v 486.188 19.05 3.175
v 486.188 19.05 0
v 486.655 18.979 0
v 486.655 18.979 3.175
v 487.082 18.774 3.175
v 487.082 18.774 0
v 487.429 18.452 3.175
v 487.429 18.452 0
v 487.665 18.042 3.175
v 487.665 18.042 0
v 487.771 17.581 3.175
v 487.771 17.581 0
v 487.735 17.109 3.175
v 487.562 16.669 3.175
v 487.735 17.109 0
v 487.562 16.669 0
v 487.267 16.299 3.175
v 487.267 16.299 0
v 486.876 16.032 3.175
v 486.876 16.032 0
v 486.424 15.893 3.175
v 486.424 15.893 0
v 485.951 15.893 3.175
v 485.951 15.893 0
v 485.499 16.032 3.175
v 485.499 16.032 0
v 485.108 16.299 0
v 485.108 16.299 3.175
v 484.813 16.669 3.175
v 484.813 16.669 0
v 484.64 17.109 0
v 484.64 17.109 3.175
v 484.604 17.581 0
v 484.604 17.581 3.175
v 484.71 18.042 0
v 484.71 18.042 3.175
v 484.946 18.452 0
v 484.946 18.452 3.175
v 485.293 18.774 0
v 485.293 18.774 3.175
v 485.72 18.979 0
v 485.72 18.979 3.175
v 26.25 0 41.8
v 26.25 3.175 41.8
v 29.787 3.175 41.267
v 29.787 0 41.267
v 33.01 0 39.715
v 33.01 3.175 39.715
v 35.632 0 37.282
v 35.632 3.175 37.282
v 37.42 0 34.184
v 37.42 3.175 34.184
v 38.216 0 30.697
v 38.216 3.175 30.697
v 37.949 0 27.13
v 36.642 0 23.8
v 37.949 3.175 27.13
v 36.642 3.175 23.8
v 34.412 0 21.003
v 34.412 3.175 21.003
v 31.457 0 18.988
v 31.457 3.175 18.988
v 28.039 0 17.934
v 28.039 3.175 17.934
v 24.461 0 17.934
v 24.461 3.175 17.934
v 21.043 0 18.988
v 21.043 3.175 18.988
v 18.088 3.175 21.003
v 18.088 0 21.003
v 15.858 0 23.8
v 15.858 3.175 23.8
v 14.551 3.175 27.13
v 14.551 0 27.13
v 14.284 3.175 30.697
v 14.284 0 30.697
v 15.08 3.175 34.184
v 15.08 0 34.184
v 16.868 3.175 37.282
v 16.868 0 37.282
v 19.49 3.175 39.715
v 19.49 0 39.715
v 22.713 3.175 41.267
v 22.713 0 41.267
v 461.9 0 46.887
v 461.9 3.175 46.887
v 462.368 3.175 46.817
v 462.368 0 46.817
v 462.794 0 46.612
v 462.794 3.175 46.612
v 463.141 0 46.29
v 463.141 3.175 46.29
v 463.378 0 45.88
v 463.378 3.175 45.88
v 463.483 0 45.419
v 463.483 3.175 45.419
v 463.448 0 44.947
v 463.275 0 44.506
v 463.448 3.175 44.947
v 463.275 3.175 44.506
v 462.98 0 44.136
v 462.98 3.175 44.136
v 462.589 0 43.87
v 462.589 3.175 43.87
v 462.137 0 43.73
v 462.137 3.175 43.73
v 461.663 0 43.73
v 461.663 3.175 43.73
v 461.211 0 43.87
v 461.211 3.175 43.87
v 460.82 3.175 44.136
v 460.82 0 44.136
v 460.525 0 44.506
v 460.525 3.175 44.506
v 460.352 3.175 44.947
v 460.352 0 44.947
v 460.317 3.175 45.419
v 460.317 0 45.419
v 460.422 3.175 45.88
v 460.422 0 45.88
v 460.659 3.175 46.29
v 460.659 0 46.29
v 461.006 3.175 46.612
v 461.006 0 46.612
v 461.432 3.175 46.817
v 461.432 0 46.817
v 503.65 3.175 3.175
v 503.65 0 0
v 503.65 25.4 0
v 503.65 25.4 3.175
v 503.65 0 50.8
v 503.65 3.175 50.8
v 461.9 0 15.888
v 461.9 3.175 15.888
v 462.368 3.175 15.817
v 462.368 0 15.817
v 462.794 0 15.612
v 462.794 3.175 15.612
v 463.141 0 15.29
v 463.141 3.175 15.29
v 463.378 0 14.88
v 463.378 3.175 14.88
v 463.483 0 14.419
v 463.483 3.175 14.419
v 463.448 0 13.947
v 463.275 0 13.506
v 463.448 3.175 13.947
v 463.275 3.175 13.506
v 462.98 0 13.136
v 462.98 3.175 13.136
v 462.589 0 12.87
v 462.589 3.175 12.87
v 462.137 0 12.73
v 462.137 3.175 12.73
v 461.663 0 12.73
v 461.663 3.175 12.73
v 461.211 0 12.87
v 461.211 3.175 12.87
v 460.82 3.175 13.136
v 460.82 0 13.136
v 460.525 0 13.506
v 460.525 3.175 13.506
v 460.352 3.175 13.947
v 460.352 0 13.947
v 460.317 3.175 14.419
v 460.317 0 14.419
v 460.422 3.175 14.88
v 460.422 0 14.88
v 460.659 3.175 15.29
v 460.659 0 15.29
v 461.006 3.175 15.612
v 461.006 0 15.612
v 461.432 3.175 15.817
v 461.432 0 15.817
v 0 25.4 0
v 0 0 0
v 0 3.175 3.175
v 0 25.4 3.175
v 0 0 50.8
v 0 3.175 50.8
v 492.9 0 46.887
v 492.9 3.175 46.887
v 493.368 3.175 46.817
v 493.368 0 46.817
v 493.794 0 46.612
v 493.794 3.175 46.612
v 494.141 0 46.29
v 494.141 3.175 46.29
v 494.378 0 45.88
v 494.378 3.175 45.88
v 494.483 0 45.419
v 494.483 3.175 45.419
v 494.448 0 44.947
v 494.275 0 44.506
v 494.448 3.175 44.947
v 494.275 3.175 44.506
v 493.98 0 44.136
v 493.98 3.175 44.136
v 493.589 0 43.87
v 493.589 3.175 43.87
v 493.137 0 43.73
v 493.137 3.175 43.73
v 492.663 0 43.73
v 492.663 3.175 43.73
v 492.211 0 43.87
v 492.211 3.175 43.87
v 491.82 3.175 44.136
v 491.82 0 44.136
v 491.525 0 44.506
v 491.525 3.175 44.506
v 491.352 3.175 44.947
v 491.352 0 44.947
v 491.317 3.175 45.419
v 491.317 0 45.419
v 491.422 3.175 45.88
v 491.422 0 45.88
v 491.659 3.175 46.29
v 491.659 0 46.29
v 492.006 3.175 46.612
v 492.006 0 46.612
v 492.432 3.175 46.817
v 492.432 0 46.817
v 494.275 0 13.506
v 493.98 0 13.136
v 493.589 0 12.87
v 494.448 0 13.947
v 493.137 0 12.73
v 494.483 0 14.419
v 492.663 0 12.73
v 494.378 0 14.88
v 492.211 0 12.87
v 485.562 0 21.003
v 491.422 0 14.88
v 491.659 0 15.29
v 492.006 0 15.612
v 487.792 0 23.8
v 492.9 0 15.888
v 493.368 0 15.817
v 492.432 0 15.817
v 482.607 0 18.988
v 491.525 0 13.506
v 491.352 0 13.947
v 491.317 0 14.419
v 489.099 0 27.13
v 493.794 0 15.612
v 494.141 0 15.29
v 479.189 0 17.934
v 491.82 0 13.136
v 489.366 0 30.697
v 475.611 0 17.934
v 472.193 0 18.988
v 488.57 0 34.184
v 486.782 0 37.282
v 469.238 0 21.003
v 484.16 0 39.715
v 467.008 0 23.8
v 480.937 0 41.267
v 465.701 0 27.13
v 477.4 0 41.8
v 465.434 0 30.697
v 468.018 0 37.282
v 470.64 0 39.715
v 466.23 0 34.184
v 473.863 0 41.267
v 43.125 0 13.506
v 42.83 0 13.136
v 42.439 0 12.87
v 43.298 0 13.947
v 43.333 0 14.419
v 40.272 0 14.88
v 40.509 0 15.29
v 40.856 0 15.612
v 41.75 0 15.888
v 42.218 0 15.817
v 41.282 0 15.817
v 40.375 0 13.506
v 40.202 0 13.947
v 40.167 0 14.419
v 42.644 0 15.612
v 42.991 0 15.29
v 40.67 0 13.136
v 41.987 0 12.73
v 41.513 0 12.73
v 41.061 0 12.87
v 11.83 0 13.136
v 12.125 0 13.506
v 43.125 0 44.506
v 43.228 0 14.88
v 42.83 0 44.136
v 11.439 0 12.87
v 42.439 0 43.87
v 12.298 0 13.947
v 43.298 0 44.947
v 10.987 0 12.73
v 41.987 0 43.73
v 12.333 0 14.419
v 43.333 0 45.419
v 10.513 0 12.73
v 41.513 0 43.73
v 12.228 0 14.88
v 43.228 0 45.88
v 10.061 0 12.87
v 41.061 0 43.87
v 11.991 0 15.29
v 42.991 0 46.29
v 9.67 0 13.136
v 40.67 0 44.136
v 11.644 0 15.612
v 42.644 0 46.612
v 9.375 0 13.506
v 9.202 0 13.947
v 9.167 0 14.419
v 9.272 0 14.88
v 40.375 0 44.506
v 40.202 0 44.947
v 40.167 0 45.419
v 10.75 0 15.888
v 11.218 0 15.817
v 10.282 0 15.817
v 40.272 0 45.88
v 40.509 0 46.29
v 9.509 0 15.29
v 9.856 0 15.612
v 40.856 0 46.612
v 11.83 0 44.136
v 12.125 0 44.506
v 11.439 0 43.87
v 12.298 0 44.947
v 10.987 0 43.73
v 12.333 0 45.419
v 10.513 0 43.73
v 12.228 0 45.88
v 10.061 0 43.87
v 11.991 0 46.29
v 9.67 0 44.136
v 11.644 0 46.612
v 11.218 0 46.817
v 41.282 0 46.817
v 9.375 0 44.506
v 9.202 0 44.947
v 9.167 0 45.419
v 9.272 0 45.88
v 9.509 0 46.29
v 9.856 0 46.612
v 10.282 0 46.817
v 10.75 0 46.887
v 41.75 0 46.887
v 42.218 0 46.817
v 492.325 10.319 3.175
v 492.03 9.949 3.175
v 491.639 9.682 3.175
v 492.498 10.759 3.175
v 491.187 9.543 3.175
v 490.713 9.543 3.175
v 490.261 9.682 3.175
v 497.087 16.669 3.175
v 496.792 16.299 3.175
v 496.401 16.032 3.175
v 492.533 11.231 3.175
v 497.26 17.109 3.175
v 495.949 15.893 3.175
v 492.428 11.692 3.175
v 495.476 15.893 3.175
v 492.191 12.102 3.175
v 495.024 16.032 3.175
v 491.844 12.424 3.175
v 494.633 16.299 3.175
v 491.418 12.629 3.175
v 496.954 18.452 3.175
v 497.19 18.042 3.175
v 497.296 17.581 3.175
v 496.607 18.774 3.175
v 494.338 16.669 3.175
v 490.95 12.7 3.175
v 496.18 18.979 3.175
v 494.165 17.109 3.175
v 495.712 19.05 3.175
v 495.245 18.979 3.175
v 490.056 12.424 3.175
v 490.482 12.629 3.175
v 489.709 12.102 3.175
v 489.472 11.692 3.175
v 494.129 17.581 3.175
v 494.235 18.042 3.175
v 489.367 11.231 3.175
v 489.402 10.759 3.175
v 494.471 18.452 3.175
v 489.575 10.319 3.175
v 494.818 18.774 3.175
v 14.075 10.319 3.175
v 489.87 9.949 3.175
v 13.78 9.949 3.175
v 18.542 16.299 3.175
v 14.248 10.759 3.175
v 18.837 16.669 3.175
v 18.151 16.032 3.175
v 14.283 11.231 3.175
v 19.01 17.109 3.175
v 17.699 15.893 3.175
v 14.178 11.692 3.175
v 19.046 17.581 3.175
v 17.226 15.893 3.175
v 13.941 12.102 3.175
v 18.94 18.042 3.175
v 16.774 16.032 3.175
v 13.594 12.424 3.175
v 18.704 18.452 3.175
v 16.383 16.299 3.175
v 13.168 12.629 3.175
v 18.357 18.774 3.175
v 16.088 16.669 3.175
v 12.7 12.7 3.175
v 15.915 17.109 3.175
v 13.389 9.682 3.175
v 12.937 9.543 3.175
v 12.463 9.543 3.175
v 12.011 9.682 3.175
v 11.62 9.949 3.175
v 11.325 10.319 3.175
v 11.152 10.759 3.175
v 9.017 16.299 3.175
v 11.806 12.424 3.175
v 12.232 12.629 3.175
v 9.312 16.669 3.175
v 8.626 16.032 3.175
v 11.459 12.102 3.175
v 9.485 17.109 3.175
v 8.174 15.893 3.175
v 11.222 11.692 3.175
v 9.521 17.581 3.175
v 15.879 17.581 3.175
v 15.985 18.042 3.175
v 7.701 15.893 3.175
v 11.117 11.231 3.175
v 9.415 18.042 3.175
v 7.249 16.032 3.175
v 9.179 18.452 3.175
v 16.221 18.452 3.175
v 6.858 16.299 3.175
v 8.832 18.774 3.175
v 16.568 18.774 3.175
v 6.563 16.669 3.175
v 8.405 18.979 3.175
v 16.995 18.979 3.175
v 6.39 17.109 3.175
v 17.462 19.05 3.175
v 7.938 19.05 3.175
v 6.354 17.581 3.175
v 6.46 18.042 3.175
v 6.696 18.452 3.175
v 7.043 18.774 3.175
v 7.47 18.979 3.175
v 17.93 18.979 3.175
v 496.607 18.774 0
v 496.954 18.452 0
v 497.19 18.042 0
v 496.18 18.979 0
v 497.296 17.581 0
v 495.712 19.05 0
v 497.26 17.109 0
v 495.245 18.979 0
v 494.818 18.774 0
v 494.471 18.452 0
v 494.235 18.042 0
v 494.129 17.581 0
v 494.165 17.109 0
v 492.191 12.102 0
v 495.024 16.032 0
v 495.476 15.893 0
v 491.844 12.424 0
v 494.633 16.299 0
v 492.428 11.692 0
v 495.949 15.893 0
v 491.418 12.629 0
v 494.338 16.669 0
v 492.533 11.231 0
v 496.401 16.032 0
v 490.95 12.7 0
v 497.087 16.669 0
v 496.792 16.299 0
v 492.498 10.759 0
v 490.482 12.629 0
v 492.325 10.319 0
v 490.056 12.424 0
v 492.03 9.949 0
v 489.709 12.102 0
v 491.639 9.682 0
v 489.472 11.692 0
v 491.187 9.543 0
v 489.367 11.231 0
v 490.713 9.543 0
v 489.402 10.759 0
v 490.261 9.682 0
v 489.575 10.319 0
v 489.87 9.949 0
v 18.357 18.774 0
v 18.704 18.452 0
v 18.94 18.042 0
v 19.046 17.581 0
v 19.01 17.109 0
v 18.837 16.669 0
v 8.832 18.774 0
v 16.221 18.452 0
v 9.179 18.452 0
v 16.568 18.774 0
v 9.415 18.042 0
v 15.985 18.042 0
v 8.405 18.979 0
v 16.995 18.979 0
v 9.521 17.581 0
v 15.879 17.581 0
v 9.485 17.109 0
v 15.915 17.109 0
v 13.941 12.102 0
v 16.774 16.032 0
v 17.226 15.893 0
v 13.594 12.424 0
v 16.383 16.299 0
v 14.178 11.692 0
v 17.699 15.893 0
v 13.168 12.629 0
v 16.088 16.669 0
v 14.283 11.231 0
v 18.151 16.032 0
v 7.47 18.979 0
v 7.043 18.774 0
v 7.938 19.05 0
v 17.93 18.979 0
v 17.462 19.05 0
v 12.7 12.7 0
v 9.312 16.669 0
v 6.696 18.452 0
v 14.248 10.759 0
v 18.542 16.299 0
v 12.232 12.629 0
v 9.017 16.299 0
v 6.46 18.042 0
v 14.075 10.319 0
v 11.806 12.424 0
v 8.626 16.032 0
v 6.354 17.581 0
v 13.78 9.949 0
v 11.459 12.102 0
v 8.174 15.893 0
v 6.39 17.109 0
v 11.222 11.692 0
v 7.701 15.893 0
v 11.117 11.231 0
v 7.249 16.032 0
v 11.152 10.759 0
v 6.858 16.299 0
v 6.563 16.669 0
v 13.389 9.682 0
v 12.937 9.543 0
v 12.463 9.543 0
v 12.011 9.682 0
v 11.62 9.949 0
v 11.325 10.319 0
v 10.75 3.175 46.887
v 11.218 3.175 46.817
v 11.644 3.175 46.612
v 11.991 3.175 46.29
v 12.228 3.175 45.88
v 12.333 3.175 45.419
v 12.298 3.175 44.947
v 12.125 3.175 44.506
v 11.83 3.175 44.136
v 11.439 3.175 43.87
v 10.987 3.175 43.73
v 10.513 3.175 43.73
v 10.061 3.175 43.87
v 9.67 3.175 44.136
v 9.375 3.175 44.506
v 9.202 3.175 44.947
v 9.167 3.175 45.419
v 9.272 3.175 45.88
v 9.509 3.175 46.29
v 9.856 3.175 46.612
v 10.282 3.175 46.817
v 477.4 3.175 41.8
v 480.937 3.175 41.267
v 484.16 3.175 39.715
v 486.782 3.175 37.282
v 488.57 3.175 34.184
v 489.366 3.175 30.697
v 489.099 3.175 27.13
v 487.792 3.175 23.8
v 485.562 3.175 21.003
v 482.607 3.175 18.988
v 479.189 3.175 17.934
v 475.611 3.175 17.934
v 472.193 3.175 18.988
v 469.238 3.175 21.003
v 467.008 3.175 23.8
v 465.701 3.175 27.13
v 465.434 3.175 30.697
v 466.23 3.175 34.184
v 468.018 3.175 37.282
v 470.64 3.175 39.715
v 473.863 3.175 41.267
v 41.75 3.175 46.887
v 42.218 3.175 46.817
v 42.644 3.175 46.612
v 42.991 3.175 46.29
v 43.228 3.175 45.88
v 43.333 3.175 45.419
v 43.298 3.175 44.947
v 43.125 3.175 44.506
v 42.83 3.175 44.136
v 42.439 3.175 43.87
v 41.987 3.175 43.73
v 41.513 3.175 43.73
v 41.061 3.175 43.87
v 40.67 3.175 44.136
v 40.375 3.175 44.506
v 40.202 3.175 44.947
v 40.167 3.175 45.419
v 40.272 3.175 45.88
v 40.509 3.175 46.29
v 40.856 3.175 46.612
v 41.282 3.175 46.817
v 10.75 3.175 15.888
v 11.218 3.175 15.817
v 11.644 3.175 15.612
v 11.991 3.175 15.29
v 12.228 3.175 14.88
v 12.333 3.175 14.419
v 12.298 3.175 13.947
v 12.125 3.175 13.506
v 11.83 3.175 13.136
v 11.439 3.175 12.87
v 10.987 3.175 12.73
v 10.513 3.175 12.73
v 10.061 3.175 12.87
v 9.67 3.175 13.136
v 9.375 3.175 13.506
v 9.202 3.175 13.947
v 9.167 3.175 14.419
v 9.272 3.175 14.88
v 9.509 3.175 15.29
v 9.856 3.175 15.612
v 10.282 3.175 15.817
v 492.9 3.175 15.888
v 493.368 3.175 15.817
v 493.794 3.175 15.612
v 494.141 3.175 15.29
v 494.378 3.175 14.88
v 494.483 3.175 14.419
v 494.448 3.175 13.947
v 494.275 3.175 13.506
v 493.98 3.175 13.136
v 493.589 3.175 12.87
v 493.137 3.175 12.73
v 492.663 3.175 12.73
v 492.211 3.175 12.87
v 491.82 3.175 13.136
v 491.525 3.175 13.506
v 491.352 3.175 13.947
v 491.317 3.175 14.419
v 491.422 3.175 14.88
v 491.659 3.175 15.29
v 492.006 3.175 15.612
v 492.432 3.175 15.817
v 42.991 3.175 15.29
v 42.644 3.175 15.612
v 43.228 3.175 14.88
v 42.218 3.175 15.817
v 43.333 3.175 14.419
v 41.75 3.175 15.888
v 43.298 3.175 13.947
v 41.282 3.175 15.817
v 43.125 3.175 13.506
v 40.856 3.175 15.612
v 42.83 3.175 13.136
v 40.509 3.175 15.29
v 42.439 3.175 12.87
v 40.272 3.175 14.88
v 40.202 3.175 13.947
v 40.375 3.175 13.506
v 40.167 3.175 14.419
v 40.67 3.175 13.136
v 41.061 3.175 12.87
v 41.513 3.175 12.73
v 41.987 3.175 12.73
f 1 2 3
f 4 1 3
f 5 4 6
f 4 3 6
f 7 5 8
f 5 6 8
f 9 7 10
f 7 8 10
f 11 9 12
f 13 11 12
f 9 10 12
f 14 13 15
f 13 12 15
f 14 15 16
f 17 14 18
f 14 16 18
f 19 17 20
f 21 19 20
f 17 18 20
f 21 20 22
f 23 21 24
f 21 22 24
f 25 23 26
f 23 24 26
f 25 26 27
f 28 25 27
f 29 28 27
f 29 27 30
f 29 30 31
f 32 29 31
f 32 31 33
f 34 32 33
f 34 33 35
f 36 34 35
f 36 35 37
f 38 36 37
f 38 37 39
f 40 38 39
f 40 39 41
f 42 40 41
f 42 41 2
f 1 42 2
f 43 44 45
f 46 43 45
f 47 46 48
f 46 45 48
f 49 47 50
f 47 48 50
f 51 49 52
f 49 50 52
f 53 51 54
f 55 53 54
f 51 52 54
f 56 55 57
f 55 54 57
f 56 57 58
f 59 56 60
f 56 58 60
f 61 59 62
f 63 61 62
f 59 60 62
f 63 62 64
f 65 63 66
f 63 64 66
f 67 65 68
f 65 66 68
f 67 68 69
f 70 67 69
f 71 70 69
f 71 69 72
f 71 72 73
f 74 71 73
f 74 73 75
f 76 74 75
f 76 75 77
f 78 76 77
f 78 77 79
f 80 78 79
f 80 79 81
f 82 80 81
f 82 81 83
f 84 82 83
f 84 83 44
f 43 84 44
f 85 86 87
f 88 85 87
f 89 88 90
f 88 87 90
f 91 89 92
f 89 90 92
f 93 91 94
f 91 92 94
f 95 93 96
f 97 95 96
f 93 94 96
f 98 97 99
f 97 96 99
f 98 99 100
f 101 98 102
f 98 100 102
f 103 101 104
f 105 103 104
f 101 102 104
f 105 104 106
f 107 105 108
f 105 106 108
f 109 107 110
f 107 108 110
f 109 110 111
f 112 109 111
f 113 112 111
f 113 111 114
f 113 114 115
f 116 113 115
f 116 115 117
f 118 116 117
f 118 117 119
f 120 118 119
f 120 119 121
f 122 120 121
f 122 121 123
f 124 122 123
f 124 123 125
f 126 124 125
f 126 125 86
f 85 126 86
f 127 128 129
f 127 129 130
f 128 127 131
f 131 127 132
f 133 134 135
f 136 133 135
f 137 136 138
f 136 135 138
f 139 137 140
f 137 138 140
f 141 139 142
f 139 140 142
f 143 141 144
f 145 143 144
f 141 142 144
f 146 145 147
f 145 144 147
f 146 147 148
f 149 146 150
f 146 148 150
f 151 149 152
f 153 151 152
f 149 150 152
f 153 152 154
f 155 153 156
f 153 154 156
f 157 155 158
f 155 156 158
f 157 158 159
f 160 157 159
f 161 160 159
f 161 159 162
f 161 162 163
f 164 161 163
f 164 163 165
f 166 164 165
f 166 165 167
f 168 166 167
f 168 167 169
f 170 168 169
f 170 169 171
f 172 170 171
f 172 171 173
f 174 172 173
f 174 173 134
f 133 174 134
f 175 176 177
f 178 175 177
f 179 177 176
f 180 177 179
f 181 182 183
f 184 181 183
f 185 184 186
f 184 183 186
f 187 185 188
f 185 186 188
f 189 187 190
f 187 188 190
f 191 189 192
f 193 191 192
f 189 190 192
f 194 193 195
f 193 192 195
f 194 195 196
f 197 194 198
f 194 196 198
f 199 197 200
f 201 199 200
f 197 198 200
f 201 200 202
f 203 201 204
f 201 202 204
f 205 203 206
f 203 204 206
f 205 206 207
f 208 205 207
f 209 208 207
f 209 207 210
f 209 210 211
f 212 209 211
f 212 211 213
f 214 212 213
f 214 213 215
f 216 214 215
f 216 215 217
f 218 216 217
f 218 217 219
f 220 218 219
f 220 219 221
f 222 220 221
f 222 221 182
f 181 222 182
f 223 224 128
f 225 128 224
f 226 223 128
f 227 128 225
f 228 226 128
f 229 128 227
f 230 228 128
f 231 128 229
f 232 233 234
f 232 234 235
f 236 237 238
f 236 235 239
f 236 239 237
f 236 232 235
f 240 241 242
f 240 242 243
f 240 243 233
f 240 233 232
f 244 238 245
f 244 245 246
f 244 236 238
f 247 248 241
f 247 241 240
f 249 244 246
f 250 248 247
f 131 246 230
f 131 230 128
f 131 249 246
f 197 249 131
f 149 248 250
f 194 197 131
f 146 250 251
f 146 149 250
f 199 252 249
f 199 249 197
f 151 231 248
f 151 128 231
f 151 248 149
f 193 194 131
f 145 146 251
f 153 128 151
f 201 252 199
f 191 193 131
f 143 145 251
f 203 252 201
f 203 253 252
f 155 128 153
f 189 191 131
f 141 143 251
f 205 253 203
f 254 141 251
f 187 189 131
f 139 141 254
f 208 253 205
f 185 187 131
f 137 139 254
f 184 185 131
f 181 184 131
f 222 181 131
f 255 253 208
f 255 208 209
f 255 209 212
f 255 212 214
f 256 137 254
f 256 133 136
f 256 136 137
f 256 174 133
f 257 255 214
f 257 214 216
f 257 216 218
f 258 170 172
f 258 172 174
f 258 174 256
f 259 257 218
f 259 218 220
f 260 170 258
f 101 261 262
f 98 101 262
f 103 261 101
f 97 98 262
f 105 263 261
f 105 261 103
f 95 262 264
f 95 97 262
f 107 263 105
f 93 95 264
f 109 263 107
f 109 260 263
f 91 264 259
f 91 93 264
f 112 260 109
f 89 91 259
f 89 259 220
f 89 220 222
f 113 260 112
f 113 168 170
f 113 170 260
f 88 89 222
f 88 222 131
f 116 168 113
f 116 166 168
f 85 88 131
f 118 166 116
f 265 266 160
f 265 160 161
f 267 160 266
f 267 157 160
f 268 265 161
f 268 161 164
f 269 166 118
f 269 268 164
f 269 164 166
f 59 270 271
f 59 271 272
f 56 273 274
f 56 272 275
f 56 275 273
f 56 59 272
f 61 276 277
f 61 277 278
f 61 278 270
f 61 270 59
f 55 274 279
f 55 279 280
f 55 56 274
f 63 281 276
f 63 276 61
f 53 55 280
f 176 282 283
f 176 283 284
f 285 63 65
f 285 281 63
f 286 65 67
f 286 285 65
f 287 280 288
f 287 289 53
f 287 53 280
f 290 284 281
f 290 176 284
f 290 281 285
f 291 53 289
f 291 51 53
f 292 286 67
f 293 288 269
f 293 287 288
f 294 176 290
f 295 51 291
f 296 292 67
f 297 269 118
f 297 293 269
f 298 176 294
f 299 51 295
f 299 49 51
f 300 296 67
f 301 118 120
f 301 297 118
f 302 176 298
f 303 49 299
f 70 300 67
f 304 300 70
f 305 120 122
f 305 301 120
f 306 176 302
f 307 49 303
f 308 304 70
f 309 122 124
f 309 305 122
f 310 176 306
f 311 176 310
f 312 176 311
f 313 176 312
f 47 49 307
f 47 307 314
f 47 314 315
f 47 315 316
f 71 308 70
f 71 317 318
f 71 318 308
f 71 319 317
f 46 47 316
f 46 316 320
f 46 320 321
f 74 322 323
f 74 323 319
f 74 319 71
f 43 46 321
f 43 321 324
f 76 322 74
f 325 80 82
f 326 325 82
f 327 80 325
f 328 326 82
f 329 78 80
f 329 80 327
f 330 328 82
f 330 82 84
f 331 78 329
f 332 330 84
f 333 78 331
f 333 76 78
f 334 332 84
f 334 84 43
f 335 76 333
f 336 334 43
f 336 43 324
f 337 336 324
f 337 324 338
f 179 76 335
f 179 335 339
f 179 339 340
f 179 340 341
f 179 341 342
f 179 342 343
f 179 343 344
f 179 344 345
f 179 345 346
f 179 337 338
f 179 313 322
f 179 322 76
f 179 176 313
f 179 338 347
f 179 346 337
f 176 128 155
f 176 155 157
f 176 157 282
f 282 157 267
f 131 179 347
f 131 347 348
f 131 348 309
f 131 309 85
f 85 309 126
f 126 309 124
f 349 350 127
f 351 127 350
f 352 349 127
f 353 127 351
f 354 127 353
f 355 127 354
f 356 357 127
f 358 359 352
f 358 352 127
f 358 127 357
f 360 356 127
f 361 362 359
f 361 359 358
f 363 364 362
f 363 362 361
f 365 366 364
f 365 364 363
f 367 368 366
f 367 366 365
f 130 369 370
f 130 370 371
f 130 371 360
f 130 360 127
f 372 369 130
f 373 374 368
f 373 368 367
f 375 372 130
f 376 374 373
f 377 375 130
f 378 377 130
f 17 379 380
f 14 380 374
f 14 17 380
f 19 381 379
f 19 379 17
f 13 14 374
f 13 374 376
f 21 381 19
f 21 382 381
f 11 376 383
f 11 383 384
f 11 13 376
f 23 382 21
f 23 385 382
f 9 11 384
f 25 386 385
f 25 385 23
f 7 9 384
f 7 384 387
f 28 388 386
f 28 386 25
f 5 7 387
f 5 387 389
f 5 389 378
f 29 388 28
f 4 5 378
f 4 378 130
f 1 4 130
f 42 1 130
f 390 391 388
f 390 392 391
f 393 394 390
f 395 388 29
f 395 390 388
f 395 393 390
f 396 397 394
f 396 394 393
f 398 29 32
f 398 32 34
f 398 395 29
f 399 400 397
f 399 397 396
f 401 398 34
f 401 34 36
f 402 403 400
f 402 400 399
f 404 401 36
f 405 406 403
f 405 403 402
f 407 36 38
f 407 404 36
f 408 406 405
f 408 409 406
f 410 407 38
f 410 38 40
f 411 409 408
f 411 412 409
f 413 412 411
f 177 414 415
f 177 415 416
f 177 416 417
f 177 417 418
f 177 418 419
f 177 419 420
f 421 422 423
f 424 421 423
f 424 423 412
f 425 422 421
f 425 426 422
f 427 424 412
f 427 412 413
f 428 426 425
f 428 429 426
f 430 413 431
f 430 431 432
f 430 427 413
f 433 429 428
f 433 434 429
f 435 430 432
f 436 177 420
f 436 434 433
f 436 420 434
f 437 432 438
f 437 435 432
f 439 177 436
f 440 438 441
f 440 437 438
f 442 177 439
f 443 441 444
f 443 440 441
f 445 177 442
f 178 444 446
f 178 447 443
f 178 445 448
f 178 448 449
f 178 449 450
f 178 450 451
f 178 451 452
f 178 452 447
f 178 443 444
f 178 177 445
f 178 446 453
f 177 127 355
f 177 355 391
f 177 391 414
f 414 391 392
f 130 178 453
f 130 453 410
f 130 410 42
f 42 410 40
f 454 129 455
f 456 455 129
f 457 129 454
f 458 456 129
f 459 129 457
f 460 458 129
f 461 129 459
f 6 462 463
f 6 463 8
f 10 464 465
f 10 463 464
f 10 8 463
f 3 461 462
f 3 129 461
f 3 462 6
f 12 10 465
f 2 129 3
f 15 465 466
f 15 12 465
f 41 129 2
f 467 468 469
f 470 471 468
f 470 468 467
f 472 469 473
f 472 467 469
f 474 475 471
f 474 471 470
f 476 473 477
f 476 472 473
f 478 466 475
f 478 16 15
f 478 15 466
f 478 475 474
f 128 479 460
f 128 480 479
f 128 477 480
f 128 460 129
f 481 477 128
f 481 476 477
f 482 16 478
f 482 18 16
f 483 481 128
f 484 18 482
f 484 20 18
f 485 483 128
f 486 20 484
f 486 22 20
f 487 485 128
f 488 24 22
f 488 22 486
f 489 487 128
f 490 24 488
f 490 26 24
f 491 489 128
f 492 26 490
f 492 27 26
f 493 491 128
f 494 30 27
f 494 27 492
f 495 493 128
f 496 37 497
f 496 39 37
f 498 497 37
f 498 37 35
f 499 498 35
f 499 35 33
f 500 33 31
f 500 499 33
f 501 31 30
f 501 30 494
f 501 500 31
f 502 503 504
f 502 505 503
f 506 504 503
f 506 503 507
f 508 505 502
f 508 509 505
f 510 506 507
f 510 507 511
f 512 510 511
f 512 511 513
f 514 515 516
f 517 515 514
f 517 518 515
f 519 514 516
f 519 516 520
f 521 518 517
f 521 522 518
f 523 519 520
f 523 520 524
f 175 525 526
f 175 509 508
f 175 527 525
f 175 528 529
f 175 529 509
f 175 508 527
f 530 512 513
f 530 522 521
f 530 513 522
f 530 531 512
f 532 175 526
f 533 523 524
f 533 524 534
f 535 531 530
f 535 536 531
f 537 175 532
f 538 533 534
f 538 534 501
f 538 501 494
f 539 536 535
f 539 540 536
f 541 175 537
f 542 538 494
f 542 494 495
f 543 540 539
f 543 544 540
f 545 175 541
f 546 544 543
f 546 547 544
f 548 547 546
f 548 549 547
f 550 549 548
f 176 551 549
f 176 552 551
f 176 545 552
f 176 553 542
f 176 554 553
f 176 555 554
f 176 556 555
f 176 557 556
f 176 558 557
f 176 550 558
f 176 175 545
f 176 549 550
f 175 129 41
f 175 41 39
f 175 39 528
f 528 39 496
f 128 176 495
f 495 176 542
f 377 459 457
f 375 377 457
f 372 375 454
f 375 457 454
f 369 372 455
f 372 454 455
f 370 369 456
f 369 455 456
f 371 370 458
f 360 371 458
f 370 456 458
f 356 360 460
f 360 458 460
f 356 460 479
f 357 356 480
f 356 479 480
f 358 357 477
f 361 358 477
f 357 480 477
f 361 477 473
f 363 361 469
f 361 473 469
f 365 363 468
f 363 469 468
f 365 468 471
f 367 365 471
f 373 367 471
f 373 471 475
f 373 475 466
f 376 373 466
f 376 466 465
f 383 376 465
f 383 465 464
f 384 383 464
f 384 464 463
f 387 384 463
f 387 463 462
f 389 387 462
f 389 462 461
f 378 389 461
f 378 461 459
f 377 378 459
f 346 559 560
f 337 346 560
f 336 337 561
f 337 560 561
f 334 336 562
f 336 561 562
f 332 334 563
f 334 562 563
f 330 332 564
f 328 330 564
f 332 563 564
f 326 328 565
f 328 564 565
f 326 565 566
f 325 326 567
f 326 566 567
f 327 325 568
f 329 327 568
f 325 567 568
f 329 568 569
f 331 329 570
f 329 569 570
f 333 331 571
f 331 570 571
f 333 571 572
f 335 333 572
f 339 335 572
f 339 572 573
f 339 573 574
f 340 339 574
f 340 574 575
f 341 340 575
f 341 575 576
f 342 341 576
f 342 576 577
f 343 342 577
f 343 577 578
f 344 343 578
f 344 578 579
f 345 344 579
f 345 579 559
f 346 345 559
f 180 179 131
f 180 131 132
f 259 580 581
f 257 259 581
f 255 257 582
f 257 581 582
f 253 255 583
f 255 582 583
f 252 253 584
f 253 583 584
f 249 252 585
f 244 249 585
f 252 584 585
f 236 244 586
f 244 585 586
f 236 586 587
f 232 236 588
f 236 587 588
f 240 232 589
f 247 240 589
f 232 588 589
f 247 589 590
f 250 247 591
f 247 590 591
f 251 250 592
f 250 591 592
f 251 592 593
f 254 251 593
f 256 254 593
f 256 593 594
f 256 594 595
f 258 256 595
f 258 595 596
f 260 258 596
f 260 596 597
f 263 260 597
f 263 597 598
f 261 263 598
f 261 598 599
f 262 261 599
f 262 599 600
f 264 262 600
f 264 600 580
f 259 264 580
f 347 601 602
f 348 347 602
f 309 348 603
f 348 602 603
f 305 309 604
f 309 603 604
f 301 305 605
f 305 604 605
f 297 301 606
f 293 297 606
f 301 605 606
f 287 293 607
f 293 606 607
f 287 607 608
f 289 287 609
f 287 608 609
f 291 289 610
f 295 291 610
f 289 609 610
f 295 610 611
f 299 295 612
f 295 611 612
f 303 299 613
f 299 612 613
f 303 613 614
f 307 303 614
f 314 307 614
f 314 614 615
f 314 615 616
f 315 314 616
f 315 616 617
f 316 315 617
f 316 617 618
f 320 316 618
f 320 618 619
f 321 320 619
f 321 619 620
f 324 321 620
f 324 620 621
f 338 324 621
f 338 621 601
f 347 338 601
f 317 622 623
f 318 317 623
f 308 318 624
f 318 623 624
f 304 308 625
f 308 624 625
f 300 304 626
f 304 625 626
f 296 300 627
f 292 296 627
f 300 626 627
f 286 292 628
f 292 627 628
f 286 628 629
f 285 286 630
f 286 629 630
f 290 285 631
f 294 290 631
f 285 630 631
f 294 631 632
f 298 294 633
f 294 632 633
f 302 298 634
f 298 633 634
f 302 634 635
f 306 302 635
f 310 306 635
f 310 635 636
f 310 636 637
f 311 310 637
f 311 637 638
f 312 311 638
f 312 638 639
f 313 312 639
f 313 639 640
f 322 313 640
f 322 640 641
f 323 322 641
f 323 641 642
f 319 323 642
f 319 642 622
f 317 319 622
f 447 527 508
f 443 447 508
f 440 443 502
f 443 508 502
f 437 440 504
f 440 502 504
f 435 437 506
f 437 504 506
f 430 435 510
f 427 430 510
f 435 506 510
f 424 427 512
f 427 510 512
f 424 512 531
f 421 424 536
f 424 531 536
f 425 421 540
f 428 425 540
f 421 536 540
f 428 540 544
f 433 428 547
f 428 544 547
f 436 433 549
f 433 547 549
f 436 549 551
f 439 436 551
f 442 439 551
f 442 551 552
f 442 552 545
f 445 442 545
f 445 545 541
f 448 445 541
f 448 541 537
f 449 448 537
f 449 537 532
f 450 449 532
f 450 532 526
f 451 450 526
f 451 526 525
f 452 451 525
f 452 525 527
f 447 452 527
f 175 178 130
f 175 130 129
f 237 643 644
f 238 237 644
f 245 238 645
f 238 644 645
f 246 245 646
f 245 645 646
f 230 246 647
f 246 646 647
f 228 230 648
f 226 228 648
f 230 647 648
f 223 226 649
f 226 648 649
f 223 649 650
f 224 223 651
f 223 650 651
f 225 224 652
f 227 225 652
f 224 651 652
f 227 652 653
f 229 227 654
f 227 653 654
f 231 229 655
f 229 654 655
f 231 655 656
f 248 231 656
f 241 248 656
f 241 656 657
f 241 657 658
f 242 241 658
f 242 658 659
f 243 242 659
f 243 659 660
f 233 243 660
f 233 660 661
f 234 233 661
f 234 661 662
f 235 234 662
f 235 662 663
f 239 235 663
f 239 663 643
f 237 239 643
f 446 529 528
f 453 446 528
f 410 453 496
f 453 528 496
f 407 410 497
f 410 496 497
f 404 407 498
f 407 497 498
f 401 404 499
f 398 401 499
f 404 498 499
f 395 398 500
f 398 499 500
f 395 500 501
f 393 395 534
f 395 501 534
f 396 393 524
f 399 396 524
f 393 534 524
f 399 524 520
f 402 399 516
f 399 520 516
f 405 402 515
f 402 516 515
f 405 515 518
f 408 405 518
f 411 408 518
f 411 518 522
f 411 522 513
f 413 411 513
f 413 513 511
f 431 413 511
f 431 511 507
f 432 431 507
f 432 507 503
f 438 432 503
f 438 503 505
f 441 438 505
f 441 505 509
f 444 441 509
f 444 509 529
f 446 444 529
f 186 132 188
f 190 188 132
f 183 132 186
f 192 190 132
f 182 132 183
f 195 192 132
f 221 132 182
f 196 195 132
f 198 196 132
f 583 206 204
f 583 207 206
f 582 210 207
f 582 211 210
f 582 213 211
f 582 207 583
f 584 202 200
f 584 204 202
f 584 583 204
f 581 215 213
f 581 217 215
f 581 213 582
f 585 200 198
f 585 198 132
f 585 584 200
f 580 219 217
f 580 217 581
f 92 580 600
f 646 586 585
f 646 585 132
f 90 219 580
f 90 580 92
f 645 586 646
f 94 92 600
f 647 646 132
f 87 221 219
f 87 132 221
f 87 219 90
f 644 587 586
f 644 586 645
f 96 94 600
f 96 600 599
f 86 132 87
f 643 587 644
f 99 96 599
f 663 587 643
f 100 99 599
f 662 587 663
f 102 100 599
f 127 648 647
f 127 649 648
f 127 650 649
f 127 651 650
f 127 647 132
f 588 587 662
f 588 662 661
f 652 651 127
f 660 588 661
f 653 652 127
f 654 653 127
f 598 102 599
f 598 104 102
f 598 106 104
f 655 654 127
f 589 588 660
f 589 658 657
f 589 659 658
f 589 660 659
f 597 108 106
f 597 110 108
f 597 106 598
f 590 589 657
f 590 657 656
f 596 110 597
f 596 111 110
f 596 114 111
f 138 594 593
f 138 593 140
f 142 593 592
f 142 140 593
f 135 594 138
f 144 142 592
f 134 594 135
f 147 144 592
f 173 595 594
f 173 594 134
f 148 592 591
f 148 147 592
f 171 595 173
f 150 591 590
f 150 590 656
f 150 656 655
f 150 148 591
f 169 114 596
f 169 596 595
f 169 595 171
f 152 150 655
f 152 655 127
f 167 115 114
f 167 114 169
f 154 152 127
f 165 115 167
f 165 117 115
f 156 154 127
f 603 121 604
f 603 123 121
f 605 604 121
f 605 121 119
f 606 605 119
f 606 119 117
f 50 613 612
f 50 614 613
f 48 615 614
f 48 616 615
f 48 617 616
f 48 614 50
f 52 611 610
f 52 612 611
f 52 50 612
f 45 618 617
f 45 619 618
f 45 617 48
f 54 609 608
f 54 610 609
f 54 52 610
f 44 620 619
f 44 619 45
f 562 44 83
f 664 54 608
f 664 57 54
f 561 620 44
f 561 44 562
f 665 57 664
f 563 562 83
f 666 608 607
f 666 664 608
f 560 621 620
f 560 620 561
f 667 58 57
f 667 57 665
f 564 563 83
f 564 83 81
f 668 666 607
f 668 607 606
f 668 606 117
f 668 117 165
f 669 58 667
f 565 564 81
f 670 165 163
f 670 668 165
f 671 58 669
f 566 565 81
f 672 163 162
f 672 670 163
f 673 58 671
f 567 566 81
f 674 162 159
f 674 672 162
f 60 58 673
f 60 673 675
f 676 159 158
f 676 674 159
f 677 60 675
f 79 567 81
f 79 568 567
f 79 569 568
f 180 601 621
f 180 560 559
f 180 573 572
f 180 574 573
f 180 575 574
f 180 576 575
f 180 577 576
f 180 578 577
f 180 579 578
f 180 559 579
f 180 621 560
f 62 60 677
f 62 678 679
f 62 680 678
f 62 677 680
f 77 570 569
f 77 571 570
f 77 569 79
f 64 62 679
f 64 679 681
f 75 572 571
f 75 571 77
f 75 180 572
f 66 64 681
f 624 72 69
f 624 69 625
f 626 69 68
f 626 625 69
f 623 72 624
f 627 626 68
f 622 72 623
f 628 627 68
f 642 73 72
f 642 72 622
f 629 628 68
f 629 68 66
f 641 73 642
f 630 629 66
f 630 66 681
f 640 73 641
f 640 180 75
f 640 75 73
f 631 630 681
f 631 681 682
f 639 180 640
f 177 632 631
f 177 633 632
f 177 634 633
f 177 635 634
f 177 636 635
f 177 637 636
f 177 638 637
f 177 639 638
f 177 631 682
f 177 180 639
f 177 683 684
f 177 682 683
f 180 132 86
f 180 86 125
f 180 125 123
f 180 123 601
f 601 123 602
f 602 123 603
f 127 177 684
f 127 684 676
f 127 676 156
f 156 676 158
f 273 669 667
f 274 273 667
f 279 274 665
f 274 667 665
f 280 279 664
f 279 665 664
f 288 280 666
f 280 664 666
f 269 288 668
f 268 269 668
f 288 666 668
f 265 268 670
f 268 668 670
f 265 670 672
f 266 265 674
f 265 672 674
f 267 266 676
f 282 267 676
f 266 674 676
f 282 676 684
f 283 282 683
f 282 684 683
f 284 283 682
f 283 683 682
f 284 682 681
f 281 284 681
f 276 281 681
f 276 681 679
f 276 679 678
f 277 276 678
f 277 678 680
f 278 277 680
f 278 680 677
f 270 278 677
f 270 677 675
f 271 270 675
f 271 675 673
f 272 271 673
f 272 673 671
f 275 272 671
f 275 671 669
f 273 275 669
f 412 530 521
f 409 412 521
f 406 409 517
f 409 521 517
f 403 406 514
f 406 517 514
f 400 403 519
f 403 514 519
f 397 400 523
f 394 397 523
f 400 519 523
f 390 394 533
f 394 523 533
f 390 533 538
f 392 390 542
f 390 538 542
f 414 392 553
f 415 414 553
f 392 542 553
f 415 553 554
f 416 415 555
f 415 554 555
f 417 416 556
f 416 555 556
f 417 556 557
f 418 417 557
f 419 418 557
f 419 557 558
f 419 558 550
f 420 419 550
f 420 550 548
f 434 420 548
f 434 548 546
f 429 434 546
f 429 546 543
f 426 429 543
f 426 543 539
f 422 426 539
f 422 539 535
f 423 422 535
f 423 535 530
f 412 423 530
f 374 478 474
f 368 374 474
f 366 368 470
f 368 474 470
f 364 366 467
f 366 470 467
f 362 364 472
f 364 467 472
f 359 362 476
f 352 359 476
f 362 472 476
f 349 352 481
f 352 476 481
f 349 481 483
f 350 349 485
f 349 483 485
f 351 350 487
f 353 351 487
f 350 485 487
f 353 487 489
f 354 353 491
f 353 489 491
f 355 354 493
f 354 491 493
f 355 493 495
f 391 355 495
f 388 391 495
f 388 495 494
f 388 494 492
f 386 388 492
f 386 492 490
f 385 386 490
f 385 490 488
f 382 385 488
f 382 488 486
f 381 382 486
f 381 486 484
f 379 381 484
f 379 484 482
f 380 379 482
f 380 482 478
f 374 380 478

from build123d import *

# Parameters (mm, degrees)
BOSS_EXTRUDE1_DEPTH              = 503.65
TOPHOLES_SKETCH2_R               = 12
TOPHOLES_SKETCH2_R_2             = 1.5875
TOPHOLES_CUT_EXTRUDE1_DEPTH      = 507.693115332
BACKSIDEHOLES_SKETCH3_R          = 1.5875
BACKSIDEHOLES_CUT_EXTRUDE2_DEPTH = 507.842305357


with BuildPart() as part:
    # Sketch1 → Boss-Extrude1 (new body)
    with BuildSketch(Plane(origin=(0, 0, 0), x_dir=(0, 0, -1), z_dir=(1, 0, 0))):
        Polygon((0, 0), (-50.8, 0), (-50.8, 3.175), (-3.175, 3.175), (-3.175, 25.4), (0, 25.4), align=None)
    extrude(amount=BOSS_EXTRUDE1_DEPTH)

    # TopHoles-Sketch2 → TopHoles-Cut-Extrude1 (cut, through all)
    with BuildSketch(Plane(origin=(0, 3.175, 0), x_dir=(1, 0, 0), z_dir=(0, 1, 0))):
        with Locations(Location((26.25, -29.8, 0), (0, 0, 270))):
            Circle(TOPHOLES_SKETCH2_R)
        with Locations(Location((477.4, -29.8, 0), (0, 0, 270))):
            Circle(TOPHOLES_SKETCH2_R)
        with Locations(Location((10.75, -14.3, 0), (0, 0, 270))):
            Circle(TOPHOLES_SKETCH2_R_2)
        with Locations(Location((41.75, -14.3, 0), (0, 0, 270))):
            Circle(TOPHOLES_SKETCH2_R_2)
        with Locations(Location((461.9, -14.3, 0), (0, 0, 270))):
            Circle(TOPHOLES_SKETCH2_R_2)
        with Locations(Location((492.9, -14.3, 0), (0, 0, 270))):
            Circle(TOPHOLES_SKETCH2_R_2)
        with Locations(Location((10.75, -45.3, 0), (0, 0, 270))):
            Circle(TOPHOLES_SKETCH2_R_2)
        with Locations(Location((41.75, -45.3, 0), (0, 0, 270))):
            Circle(TOPHOLES_SKETCH2_R_2)
        with Locations(Location((461.9, -45.3, 0), (0, 0, 270))):
            Circle(TOPHOLES_SKETCH2_R_2)
        with Locations(Location((492.9, -45.3, 0), (0, 0, 270))):
            Circle(TOPHOLES_SKETCH2_R_2)
    extrude(amount=-TOPHOLES_CUT_EXTRUDE1_DEPTH, mode=Mode.SUBTRACT)

    # BackSideHoles-Sketch3 → BackSideHoles-Cut-Extrude2 (cut, through all)
    with BuildSketch(Plane(origin=(0, 0, 0), x_dir=(-1, 0, 0), z_dir=(0, 0, -1))):
        with Locations(Location((-495.7125, 17.4625, 0), (0, 0, 90))):
            Circle(BACKSIDEHOLES_SKETCH3_R)
        with Locations(Location((-486.1875, 17.4625, 0), (0, 0, 90))):
            Circle(BACKSIDEHOLES_SKETCH3_R)
        with Locations(Location((-490.95, 11.1125, 0), (0, 0, 90))):
            Circle(BACKSIDEHOLES_SKETCH3_R)
        with Locations(Location((-12.7, 11.1125, 0), (0, 0, 90))):
            Circle(BACKSIDEHOLES_SKETCH3_R)
        with Locations(Location((-17.4625, 17.4625, 0), (0, 0, 90))):
            Circle(BACKSIDEHOLES_SKETCH3_R)
        with Locations(Location((-7.9375, 17.4625, 0), (0, 0, 90))):
            Circle(BACKSIDEHOLES_SKETCH3_R)
    extrude(amount=-BACKSIDEHOLES_CUT_EXTRUDE2_DEPTH, mode=Mode.SUBTRACT)


solid = part.part
